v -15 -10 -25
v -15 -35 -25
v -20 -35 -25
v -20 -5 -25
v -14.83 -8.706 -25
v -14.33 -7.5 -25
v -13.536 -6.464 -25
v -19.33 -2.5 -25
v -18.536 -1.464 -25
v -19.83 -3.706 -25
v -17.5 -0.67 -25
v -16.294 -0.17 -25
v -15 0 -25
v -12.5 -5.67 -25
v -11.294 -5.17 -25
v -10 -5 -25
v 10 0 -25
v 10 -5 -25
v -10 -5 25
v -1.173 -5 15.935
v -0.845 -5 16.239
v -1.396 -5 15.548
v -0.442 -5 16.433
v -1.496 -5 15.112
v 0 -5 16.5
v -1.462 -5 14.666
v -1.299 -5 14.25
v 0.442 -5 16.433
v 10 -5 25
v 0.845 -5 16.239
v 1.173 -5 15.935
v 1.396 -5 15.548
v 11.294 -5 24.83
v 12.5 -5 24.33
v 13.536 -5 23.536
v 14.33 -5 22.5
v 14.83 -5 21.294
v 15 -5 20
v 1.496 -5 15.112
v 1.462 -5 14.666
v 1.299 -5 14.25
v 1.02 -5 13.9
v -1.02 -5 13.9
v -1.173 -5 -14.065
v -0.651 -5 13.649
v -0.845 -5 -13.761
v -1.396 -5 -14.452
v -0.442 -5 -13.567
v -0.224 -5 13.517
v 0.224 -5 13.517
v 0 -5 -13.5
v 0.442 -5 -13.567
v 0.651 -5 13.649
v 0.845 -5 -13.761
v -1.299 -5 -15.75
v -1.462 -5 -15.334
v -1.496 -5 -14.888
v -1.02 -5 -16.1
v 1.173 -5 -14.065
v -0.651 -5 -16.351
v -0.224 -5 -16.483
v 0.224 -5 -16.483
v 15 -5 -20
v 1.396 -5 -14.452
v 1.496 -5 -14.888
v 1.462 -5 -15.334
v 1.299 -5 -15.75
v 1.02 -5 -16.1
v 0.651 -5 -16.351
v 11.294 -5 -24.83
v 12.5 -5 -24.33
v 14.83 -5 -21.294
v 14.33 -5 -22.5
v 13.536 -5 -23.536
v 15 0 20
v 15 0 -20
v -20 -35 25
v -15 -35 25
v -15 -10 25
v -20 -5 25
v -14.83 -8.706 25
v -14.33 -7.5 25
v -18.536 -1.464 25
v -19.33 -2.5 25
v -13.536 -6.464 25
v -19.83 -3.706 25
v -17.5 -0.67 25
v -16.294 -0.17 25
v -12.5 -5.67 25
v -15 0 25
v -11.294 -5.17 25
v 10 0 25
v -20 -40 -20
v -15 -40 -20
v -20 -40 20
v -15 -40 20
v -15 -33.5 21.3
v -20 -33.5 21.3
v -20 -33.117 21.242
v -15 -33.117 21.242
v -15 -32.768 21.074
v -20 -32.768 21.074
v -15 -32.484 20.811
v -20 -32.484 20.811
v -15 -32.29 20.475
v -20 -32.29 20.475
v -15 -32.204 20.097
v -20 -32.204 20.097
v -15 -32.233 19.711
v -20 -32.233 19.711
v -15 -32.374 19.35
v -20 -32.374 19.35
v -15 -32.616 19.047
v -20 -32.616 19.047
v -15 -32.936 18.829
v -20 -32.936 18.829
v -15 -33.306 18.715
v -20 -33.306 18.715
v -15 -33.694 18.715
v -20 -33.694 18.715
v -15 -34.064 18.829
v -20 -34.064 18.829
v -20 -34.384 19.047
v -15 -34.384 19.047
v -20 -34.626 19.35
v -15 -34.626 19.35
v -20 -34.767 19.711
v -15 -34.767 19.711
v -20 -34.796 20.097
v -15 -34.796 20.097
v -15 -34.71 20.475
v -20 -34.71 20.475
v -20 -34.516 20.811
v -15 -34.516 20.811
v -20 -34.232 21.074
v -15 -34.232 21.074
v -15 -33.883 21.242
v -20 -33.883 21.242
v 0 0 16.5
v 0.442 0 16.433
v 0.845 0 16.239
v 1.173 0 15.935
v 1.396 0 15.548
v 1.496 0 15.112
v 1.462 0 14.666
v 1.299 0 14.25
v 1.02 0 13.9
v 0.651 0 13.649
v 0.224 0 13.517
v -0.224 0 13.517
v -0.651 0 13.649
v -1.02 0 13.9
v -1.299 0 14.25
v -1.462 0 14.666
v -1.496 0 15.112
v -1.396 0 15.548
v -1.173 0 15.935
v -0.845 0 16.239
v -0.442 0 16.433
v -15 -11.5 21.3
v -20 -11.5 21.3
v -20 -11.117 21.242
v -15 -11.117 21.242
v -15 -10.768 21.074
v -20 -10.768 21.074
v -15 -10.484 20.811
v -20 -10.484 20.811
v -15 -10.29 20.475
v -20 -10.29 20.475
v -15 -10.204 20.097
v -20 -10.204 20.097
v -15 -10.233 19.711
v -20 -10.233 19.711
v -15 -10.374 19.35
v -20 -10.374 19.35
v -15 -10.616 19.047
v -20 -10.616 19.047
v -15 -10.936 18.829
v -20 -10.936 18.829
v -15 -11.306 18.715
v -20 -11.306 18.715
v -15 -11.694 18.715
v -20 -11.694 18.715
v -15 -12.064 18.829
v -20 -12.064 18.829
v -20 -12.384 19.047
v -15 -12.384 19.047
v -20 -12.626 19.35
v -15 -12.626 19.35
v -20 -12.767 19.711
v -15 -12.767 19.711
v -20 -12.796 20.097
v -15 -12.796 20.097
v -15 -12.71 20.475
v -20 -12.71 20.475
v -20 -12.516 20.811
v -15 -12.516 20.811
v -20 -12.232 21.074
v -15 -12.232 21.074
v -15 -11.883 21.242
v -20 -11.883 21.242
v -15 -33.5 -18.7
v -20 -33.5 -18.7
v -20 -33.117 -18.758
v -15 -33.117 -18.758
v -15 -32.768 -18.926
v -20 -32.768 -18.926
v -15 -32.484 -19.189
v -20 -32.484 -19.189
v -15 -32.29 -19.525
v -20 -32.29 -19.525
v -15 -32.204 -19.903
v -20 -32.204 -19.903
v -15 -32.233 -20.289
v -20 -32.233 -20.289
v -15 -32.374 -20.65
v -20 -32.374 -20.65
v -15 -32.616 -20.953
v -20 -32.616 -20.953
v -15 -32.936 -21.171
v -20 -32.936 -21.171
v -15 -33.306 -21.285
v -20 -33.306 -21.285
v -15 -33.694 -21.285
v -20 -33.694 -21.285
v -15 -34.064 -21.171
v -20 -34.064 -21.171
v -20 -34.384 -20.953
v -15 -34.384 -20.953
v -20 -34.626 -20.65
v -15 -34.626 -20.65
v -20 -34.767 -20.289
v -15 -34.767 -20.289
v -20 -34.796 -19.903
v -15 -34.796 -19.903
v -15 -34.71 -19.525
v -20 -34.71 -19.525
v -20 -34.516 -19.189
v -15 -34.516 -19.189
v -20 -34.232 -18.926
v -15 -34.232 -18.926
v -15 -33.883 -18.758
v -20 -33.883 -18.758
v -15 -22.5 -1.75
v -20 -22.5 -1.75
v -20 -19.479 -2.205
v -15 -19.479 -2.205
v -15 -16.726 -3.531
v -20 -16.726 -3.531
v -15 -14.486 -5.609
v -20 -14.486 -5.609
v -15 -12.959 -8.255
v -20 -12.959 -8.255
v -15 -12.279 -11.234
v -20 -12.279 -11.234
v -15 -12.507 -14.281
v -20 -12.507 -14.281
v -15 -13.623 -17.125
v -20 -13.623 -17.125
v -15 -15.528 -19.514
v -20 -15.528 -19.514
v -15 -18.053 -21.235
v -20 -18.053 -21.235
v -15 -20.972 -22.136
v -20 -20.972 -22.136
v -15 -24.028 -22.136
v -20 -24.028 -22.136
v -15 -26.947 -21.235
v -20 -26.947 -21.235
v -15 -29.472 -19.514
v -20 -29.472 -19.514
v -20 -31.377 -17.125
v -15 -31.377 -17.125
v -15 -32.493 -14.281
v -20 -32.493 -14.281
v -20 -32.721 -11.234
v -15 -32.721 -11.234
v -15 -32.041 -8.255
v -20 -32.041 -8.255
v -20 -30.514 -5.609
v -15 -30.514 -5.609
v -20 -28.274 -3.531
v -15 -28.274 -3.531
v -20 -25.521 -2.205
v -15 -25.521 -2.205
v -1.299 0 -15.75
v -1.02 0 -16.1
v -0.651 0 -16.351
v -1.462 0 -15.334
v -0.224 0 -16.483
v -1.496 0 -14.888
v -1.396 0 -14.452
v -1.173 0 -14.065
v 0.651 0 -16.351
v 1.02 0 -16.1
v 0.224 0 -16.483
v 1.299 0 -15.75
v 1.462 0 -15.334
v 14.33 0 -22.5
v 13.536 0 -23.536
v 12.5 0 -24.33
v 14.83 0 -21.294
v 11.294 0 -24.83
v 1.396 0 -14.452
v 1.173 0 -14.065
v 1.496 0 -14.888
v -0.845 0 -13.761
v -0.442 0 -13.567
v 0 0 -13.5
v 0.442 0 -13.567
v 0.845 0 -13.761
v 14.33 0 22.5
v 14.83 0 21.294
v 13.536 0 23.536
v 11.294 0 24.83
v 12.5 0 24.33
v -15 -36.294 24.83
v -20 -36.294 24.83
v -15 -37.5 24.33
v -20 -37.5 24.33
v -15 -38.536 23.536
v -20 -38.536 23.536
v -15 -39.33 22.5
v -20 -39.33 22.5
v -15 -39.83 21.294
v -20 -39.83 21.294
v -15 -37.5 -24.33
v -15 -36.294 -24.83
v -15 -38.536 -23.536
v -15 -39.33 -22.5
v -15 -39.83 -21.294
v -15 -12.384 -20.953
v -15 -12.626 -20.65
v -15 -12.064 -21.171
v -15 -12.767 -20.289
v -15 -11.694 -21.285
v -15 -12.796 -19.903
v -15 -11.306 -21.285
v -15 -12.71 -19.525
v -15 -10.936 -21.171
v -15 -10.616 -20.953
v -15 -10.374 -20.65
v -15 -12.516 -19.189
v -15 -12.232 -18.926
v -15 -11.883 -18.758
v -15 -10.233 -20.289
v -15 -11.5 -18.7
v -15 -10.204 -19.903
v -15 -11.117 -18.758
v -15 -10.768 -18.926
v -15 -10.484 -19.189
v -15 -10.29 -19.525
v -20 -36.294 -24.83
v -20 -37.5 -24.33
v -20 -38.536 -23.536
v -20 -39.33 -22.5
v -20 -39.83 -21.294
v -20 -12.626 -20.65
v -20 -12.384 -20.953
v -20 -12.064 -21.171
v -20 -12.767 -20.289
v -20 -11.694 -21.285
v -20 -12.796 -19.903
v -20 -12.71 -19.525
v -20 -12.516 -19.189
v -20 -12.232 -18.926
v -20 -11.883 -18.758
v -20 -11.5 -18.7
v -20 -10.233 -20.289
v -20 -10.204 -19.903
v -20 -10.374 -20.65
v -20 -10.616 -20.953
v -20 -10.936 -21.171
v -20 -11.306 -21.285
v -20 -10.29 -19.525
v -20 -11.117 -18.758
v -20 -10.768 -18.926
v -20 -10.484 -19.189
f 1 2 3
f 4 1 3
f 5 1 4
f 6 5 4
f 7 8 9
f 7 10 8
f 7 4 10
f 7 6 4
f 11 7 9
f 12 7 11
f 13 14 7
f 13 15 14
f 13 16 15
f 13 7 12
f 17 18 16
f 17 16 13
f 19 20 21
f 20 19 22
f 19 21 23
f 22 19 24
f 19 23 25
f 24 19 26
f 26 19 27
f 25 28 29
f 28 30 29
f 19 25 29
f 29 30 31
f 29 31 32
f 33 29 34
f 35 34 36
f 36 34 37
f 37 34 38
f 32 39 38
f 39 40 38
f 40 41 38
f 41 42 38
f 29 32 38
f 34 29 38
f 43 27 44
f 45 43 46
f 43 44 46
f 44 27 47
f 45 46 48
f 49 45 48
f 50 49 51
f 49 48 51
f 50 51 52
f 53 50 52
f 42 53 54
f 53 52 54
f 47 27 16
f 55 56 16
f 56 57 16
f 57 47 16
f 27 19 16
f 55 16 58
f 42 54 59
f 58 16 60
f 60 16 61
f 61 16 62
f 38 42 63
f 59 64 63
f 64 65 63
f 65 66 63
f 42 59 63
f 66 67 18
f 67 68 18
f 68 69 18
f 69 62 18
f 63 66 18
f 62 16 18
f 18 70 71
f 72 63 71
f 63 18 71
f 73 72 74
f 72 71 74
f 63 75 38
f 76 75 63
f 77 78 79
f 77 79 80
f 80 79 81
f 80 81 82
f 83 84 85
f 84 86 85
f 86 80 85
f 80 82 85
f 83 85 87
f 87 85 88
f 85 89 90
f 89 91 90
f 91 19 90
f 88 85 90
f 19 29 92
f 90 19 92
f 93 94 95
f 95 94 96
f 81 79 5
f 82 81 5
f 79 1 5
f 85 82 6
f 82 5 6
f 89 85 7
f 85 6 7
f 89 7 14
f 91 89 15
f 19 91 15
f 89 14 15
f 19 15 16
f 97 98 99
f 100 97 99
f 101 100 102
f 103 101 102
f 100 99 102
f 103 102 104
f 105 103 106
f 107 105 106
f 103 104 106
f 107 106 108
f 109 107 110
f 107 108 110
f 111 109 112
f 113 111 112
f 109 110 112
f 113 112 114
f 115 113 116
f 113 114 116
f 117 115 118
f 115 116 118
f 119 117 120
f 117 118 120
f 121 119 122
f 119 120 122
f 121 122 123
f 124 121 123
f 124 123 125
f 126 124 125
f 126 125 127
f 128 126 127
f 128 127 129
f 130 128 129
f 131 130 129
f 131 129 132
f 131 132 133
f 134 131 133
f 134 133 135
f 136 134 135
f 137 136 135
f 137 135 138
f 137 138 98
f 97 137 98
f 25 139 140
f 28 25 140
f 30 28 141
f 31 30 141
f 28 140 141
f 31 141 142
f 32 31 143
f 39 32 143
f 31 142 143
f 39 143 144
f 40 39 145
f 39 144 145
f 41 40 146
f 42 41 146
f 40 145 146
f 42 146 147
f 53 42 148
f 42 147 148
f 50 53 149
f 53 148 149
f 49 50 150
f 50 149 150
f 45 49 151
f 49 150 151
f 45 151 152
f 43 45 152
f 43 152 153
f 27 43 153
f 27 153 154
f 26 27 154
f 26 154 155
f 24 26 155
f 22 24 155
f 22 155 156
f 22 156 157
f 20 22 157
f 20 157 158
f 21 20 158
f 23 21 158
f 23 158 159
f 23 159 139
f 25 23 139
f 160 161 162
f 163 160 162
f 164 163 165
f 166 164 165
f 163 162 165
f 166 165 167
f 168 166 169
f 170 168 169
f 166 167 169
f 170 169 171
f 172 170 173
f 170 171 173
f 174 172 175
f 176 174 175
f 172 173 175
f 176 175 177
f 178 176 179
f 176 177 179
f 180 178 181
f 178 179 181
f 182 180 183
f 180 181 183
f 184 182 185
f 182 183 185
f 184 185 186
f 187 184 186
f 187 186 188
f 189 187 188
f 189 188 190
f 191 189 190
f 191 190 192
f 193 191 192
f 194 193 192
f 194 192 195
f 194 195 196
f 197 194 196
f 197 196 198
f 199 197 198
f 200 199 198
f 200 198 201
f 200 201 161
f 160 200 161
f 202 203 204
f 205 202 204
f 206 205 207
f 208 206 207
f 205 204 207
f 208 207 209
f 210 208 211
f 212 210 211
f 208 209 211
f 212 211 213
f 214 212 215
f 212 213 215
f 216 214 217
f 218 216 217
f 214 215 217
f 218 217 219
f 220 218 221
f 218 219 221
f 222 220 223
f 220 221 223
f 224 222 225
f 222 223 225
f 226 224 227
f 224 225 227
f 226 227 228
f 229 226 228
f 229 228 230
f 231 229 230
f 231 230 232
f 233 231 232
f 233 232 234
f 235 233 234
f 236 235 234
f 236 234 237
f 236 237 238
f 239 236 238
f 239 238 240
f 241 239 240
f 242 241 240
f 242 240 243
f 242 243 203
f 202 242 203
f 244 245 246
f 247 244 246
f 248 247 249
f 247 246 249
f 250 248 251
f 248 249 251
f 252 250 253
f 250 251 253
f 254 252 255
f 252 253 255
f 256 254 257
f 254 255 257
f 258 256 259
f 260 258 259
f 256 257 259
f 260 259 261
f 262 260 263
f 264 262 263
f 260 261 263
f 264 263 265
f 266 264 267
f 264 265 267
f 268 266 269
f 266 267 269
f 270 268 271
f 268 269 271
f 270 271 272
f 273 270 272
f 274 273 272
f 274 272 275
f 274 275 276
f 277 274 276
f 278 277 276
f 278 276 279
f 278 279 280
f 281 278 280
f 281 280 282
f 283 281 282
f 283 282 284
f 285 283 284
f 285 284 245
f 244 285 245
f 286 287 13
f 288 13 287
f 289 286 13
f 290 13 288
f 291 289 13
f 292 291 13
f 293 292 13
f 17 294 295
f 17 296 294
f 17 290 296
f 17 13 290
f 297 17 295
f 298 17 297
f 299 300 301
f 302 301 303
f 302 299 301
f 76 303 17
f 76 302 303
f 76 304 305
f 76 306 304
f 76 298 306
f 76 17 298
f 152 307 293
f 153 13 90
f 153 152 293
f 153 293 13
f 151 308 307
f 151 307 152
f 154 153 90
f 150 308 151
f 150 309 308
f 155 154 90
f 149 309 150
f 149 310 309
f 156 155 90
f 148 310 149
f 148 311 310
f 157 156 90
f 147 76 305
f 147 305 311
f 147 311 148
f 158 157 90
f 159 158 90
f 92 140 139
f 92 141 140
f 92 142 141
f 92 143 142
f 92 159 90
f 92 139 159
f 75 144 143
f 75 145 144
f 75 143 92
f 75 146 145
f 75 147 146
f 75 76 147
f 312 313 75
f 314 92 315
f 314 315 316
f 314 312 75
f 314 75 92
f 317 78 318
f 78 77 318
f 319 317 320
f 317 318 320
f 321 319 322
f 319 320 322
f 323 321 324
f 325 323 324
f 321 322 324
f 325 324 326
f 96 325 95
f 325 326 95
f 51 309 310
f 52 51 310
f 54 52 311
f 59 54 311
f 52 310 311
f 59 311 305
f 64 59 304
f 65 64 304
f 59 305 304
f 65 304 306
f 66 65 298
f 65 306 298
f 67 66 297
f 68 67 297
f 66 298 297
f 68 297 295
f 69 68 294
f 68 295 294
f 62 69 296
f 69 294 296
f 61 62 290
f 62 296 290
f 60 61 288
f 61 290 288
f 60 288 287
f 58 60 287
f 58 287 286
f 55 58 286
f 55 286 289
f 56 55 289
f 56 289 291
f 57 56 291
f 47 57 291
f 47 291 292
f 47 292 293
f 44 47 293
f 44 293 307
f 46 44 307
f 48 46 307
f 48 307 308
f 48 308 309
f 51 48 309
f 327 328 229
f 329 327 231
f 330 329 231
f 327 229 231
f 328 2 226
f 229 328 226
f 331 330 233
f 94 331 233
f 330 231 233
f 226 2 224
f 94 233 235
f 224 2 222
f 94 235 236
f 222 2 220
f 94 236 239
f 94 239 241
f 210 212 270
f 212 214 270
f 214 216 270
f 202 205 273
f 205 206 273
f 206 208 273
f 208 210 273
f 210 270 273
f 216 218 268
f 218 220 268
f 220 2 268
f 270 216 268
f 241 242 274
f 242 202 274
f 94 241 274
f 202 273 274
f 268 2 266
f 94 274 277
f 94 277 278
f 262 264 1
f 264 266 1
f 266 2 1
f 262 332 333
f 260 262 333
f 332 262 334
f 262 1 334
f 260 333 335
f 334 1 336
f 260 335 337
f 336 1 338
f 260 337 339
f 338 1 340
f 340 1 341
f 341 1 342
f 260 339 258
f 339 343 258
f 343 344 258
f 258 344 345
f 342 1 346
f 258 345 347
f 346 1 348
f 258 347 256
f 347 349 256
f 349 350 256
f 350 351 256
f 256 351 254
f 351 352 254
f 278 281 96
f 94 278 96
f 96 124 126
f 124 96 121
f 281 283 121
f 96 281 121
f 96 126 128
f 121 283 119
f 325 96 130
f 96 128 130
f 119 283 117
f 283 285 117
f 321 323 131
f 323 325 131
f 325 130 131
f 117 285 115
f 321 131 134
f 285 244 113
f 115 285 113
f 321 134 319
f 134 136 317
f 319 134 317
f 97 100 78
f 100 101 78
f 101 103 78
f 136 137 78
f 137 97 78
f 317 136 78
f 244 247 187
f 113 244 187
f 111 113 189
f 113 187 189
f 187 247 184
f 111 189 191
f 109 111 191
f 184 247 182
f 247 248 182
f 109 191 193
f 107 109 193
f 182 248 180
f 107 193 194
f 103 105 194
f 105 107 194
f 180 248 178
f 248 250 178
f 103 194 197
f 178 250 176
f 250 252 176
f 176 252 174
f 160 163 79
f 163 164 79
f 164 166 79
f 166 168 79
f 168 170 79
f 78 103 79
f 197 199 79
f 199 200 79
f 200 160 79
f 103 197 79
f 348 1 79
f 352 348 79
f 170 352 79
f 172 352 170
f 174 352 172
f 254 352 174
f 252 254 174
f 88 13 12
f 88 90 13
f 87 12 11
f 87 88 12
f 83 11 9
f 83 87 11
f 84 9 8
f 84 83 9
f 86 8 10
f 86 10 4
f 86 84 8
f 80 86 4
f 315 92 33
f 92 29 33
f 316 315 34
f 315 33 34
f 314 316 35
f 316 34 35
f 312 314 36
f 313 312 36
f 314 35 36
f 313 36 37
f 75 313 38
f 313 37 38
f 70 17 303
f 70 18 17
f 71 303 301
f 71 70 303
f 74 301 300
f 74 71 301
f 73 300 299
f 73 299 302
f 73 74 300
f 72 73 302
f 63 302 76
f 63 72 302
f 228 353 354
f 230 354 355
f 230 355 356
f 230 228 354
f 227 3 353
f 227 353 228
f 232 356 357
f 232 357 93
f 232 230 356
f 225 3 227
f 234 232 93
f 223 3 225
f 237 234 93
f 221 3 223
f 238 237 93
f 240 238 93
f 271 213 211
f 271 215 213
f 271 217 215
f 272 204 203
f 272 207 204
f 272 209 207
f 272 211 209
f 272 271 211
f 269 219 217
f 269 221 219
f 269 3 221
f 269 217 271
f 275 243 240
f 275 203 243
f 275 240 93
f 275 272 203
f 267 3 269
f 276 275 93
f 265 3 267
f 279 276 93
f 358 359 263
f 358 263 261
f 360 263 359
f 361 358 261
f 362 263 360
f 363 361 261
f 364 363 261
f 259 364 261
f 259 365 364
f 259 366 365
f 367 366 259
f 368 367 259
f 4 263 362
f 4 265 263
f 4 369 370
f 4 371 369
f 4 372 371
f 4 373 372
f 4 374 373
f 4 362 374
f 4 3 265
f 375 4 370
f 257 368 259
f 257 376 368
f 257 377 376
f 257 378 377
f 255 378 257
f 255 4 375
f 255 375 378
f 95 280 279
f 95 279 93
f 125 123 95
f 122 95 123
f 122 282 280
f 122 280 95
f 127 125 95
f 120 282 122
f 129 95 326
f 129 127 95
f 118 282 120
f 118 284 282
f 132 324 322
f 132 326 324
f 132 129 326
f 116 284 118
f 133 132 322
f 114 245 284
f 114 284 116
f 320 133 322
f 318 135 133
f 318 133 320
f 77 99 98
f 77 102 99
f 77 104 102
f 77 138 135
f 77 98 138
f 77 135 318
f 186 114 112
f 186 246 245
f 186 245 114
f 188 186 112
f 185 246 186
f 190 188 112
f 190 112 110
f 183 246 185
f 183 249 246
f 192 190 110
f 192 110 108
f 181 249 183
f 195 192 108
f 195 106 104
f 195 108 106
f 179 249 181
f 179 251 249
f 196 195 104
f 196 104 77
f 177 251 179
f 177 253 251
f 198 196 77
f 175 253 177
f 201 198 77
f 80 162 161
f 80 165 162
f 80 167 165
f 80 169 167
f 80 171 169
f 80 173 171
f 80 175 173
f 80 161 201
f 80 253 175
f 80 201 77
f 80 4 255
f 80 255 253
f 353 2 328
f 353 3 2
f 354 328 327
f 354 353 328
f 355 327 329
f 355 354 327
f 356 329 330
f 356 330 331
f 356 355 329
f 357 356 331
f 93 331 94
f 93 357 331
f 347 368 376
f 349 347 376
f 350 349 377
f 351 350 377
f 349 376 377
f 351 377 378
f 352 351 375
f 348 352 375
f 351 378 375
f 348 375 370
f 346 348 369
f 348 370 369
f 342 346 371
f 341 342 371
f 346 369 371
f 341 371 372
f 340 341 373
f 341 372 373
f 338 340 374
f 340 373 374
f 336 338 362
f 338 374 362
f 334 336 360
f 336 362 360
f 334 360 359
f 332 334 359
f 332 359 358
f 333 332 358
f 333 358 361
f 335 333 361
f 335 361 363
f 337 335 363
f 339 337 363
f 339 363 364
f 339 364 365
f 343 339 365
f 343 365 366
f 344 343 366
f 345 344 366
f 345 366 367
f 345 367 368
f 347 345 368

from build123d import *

# Parameters (mm, degrees)
ESQUISSE1_W             = 30
ESQUISSE1_H             = 50
BOSS_EXTRU_1_DEPTH      = 5
ESQUISSE2_W             = 50
ESQUISSE2_H             = 40
BOSS_EXTRU_2_DEPTH      = 5
CONG_2_R                = 5
ESQUISSE11_R            = 1.5
ENL_V_MAT_EXTRU_2_DEPTH = 52.23475383
ESQUISSE12_R            = 10.25
ESQUISSE12_R_2          = 1.3
ENL_V_MAT_EXTRU_3_DEPTH = 59.736700622


with BuildPart() as part:
    # Esquisse1 → Boss.-Extru.1 (new body)
    with BuildSketch(Plane(origin=(0, 0, 0), x_dir=(1, 0, 0), z_dir=(0, 1, 0))):
        Rectangle(ESQUISSE1_W, ESQUISSE1_H)
    extrude(amount=-BOSS_EXTRU_1_DEPTH)

    # Esquisse2 → Boss.-Extru.2 (add)
    with BuildSketch(Plane.ZY.offset(15)):
        with Locations((0, -20)):
            Rectangle(ESQUISSE2_W, ESQUISSE2_H)
    extrude(amount=BOSS_EXTRU_2_DEPTH)

    # Congé2
    cong_2_edges = [part.edges().sort_by_distance(p)[0] for p in [
        (-15, -5, 0),
        (-17.5, -40, 25),
        (-17.5, -40, -25),
        (-20, 0, 0),
        (15, -2.5, 25),
        (15, -2.5, -25),
    ]]
    fillet(cong_2_edges, radius=CONG_2_R)

    # Esquisse11 → Enlèv. mat.-Extru.2 (cut, through all)
    with BuildSketch(Plane(origin=(0, 0, 0), x_dir=(1, 0, 0), z_dir=(0, 1, 0))):
        with Locations(Location((0, 15, 0), (0, 0, 270))):
            Circle(ESQUISSE11_R)
        with Locations(Location((0, -15, 0), (0, 0, 270))):
            Circle(ESQUISSE11_R)
    extrude(amount=-ENL_V_MAT_EXTRU_2_DEPTH, mode=Mode.SUBTRACT)

    # Esquisse12 → Enlèv. mat.-Extru.3 (cut, through all)
    with BuildSketch(Plane.ZY.offset(20)):
        with Locations((-12, -22.5)):
            Circle(ESQUISSE12_R)
        with Locations((-20, -11.5)):
            Circle(ESQUISSE12_R_2)
        with Locations((-20, -33.5)):
            Circle(ESQUISSE12_R_2)
        with Locations((20, -33.5)):
            Circle(ESQUISSE12_R_2)
        with Locations((20, -11.5)):
            Circle(ESQUISSE12_R_2)
    extrude(amount=-ENL_V_MAT_EXTRU_3_DEPTH, mode=Mode.SUBTRACT)


solid = part.part
